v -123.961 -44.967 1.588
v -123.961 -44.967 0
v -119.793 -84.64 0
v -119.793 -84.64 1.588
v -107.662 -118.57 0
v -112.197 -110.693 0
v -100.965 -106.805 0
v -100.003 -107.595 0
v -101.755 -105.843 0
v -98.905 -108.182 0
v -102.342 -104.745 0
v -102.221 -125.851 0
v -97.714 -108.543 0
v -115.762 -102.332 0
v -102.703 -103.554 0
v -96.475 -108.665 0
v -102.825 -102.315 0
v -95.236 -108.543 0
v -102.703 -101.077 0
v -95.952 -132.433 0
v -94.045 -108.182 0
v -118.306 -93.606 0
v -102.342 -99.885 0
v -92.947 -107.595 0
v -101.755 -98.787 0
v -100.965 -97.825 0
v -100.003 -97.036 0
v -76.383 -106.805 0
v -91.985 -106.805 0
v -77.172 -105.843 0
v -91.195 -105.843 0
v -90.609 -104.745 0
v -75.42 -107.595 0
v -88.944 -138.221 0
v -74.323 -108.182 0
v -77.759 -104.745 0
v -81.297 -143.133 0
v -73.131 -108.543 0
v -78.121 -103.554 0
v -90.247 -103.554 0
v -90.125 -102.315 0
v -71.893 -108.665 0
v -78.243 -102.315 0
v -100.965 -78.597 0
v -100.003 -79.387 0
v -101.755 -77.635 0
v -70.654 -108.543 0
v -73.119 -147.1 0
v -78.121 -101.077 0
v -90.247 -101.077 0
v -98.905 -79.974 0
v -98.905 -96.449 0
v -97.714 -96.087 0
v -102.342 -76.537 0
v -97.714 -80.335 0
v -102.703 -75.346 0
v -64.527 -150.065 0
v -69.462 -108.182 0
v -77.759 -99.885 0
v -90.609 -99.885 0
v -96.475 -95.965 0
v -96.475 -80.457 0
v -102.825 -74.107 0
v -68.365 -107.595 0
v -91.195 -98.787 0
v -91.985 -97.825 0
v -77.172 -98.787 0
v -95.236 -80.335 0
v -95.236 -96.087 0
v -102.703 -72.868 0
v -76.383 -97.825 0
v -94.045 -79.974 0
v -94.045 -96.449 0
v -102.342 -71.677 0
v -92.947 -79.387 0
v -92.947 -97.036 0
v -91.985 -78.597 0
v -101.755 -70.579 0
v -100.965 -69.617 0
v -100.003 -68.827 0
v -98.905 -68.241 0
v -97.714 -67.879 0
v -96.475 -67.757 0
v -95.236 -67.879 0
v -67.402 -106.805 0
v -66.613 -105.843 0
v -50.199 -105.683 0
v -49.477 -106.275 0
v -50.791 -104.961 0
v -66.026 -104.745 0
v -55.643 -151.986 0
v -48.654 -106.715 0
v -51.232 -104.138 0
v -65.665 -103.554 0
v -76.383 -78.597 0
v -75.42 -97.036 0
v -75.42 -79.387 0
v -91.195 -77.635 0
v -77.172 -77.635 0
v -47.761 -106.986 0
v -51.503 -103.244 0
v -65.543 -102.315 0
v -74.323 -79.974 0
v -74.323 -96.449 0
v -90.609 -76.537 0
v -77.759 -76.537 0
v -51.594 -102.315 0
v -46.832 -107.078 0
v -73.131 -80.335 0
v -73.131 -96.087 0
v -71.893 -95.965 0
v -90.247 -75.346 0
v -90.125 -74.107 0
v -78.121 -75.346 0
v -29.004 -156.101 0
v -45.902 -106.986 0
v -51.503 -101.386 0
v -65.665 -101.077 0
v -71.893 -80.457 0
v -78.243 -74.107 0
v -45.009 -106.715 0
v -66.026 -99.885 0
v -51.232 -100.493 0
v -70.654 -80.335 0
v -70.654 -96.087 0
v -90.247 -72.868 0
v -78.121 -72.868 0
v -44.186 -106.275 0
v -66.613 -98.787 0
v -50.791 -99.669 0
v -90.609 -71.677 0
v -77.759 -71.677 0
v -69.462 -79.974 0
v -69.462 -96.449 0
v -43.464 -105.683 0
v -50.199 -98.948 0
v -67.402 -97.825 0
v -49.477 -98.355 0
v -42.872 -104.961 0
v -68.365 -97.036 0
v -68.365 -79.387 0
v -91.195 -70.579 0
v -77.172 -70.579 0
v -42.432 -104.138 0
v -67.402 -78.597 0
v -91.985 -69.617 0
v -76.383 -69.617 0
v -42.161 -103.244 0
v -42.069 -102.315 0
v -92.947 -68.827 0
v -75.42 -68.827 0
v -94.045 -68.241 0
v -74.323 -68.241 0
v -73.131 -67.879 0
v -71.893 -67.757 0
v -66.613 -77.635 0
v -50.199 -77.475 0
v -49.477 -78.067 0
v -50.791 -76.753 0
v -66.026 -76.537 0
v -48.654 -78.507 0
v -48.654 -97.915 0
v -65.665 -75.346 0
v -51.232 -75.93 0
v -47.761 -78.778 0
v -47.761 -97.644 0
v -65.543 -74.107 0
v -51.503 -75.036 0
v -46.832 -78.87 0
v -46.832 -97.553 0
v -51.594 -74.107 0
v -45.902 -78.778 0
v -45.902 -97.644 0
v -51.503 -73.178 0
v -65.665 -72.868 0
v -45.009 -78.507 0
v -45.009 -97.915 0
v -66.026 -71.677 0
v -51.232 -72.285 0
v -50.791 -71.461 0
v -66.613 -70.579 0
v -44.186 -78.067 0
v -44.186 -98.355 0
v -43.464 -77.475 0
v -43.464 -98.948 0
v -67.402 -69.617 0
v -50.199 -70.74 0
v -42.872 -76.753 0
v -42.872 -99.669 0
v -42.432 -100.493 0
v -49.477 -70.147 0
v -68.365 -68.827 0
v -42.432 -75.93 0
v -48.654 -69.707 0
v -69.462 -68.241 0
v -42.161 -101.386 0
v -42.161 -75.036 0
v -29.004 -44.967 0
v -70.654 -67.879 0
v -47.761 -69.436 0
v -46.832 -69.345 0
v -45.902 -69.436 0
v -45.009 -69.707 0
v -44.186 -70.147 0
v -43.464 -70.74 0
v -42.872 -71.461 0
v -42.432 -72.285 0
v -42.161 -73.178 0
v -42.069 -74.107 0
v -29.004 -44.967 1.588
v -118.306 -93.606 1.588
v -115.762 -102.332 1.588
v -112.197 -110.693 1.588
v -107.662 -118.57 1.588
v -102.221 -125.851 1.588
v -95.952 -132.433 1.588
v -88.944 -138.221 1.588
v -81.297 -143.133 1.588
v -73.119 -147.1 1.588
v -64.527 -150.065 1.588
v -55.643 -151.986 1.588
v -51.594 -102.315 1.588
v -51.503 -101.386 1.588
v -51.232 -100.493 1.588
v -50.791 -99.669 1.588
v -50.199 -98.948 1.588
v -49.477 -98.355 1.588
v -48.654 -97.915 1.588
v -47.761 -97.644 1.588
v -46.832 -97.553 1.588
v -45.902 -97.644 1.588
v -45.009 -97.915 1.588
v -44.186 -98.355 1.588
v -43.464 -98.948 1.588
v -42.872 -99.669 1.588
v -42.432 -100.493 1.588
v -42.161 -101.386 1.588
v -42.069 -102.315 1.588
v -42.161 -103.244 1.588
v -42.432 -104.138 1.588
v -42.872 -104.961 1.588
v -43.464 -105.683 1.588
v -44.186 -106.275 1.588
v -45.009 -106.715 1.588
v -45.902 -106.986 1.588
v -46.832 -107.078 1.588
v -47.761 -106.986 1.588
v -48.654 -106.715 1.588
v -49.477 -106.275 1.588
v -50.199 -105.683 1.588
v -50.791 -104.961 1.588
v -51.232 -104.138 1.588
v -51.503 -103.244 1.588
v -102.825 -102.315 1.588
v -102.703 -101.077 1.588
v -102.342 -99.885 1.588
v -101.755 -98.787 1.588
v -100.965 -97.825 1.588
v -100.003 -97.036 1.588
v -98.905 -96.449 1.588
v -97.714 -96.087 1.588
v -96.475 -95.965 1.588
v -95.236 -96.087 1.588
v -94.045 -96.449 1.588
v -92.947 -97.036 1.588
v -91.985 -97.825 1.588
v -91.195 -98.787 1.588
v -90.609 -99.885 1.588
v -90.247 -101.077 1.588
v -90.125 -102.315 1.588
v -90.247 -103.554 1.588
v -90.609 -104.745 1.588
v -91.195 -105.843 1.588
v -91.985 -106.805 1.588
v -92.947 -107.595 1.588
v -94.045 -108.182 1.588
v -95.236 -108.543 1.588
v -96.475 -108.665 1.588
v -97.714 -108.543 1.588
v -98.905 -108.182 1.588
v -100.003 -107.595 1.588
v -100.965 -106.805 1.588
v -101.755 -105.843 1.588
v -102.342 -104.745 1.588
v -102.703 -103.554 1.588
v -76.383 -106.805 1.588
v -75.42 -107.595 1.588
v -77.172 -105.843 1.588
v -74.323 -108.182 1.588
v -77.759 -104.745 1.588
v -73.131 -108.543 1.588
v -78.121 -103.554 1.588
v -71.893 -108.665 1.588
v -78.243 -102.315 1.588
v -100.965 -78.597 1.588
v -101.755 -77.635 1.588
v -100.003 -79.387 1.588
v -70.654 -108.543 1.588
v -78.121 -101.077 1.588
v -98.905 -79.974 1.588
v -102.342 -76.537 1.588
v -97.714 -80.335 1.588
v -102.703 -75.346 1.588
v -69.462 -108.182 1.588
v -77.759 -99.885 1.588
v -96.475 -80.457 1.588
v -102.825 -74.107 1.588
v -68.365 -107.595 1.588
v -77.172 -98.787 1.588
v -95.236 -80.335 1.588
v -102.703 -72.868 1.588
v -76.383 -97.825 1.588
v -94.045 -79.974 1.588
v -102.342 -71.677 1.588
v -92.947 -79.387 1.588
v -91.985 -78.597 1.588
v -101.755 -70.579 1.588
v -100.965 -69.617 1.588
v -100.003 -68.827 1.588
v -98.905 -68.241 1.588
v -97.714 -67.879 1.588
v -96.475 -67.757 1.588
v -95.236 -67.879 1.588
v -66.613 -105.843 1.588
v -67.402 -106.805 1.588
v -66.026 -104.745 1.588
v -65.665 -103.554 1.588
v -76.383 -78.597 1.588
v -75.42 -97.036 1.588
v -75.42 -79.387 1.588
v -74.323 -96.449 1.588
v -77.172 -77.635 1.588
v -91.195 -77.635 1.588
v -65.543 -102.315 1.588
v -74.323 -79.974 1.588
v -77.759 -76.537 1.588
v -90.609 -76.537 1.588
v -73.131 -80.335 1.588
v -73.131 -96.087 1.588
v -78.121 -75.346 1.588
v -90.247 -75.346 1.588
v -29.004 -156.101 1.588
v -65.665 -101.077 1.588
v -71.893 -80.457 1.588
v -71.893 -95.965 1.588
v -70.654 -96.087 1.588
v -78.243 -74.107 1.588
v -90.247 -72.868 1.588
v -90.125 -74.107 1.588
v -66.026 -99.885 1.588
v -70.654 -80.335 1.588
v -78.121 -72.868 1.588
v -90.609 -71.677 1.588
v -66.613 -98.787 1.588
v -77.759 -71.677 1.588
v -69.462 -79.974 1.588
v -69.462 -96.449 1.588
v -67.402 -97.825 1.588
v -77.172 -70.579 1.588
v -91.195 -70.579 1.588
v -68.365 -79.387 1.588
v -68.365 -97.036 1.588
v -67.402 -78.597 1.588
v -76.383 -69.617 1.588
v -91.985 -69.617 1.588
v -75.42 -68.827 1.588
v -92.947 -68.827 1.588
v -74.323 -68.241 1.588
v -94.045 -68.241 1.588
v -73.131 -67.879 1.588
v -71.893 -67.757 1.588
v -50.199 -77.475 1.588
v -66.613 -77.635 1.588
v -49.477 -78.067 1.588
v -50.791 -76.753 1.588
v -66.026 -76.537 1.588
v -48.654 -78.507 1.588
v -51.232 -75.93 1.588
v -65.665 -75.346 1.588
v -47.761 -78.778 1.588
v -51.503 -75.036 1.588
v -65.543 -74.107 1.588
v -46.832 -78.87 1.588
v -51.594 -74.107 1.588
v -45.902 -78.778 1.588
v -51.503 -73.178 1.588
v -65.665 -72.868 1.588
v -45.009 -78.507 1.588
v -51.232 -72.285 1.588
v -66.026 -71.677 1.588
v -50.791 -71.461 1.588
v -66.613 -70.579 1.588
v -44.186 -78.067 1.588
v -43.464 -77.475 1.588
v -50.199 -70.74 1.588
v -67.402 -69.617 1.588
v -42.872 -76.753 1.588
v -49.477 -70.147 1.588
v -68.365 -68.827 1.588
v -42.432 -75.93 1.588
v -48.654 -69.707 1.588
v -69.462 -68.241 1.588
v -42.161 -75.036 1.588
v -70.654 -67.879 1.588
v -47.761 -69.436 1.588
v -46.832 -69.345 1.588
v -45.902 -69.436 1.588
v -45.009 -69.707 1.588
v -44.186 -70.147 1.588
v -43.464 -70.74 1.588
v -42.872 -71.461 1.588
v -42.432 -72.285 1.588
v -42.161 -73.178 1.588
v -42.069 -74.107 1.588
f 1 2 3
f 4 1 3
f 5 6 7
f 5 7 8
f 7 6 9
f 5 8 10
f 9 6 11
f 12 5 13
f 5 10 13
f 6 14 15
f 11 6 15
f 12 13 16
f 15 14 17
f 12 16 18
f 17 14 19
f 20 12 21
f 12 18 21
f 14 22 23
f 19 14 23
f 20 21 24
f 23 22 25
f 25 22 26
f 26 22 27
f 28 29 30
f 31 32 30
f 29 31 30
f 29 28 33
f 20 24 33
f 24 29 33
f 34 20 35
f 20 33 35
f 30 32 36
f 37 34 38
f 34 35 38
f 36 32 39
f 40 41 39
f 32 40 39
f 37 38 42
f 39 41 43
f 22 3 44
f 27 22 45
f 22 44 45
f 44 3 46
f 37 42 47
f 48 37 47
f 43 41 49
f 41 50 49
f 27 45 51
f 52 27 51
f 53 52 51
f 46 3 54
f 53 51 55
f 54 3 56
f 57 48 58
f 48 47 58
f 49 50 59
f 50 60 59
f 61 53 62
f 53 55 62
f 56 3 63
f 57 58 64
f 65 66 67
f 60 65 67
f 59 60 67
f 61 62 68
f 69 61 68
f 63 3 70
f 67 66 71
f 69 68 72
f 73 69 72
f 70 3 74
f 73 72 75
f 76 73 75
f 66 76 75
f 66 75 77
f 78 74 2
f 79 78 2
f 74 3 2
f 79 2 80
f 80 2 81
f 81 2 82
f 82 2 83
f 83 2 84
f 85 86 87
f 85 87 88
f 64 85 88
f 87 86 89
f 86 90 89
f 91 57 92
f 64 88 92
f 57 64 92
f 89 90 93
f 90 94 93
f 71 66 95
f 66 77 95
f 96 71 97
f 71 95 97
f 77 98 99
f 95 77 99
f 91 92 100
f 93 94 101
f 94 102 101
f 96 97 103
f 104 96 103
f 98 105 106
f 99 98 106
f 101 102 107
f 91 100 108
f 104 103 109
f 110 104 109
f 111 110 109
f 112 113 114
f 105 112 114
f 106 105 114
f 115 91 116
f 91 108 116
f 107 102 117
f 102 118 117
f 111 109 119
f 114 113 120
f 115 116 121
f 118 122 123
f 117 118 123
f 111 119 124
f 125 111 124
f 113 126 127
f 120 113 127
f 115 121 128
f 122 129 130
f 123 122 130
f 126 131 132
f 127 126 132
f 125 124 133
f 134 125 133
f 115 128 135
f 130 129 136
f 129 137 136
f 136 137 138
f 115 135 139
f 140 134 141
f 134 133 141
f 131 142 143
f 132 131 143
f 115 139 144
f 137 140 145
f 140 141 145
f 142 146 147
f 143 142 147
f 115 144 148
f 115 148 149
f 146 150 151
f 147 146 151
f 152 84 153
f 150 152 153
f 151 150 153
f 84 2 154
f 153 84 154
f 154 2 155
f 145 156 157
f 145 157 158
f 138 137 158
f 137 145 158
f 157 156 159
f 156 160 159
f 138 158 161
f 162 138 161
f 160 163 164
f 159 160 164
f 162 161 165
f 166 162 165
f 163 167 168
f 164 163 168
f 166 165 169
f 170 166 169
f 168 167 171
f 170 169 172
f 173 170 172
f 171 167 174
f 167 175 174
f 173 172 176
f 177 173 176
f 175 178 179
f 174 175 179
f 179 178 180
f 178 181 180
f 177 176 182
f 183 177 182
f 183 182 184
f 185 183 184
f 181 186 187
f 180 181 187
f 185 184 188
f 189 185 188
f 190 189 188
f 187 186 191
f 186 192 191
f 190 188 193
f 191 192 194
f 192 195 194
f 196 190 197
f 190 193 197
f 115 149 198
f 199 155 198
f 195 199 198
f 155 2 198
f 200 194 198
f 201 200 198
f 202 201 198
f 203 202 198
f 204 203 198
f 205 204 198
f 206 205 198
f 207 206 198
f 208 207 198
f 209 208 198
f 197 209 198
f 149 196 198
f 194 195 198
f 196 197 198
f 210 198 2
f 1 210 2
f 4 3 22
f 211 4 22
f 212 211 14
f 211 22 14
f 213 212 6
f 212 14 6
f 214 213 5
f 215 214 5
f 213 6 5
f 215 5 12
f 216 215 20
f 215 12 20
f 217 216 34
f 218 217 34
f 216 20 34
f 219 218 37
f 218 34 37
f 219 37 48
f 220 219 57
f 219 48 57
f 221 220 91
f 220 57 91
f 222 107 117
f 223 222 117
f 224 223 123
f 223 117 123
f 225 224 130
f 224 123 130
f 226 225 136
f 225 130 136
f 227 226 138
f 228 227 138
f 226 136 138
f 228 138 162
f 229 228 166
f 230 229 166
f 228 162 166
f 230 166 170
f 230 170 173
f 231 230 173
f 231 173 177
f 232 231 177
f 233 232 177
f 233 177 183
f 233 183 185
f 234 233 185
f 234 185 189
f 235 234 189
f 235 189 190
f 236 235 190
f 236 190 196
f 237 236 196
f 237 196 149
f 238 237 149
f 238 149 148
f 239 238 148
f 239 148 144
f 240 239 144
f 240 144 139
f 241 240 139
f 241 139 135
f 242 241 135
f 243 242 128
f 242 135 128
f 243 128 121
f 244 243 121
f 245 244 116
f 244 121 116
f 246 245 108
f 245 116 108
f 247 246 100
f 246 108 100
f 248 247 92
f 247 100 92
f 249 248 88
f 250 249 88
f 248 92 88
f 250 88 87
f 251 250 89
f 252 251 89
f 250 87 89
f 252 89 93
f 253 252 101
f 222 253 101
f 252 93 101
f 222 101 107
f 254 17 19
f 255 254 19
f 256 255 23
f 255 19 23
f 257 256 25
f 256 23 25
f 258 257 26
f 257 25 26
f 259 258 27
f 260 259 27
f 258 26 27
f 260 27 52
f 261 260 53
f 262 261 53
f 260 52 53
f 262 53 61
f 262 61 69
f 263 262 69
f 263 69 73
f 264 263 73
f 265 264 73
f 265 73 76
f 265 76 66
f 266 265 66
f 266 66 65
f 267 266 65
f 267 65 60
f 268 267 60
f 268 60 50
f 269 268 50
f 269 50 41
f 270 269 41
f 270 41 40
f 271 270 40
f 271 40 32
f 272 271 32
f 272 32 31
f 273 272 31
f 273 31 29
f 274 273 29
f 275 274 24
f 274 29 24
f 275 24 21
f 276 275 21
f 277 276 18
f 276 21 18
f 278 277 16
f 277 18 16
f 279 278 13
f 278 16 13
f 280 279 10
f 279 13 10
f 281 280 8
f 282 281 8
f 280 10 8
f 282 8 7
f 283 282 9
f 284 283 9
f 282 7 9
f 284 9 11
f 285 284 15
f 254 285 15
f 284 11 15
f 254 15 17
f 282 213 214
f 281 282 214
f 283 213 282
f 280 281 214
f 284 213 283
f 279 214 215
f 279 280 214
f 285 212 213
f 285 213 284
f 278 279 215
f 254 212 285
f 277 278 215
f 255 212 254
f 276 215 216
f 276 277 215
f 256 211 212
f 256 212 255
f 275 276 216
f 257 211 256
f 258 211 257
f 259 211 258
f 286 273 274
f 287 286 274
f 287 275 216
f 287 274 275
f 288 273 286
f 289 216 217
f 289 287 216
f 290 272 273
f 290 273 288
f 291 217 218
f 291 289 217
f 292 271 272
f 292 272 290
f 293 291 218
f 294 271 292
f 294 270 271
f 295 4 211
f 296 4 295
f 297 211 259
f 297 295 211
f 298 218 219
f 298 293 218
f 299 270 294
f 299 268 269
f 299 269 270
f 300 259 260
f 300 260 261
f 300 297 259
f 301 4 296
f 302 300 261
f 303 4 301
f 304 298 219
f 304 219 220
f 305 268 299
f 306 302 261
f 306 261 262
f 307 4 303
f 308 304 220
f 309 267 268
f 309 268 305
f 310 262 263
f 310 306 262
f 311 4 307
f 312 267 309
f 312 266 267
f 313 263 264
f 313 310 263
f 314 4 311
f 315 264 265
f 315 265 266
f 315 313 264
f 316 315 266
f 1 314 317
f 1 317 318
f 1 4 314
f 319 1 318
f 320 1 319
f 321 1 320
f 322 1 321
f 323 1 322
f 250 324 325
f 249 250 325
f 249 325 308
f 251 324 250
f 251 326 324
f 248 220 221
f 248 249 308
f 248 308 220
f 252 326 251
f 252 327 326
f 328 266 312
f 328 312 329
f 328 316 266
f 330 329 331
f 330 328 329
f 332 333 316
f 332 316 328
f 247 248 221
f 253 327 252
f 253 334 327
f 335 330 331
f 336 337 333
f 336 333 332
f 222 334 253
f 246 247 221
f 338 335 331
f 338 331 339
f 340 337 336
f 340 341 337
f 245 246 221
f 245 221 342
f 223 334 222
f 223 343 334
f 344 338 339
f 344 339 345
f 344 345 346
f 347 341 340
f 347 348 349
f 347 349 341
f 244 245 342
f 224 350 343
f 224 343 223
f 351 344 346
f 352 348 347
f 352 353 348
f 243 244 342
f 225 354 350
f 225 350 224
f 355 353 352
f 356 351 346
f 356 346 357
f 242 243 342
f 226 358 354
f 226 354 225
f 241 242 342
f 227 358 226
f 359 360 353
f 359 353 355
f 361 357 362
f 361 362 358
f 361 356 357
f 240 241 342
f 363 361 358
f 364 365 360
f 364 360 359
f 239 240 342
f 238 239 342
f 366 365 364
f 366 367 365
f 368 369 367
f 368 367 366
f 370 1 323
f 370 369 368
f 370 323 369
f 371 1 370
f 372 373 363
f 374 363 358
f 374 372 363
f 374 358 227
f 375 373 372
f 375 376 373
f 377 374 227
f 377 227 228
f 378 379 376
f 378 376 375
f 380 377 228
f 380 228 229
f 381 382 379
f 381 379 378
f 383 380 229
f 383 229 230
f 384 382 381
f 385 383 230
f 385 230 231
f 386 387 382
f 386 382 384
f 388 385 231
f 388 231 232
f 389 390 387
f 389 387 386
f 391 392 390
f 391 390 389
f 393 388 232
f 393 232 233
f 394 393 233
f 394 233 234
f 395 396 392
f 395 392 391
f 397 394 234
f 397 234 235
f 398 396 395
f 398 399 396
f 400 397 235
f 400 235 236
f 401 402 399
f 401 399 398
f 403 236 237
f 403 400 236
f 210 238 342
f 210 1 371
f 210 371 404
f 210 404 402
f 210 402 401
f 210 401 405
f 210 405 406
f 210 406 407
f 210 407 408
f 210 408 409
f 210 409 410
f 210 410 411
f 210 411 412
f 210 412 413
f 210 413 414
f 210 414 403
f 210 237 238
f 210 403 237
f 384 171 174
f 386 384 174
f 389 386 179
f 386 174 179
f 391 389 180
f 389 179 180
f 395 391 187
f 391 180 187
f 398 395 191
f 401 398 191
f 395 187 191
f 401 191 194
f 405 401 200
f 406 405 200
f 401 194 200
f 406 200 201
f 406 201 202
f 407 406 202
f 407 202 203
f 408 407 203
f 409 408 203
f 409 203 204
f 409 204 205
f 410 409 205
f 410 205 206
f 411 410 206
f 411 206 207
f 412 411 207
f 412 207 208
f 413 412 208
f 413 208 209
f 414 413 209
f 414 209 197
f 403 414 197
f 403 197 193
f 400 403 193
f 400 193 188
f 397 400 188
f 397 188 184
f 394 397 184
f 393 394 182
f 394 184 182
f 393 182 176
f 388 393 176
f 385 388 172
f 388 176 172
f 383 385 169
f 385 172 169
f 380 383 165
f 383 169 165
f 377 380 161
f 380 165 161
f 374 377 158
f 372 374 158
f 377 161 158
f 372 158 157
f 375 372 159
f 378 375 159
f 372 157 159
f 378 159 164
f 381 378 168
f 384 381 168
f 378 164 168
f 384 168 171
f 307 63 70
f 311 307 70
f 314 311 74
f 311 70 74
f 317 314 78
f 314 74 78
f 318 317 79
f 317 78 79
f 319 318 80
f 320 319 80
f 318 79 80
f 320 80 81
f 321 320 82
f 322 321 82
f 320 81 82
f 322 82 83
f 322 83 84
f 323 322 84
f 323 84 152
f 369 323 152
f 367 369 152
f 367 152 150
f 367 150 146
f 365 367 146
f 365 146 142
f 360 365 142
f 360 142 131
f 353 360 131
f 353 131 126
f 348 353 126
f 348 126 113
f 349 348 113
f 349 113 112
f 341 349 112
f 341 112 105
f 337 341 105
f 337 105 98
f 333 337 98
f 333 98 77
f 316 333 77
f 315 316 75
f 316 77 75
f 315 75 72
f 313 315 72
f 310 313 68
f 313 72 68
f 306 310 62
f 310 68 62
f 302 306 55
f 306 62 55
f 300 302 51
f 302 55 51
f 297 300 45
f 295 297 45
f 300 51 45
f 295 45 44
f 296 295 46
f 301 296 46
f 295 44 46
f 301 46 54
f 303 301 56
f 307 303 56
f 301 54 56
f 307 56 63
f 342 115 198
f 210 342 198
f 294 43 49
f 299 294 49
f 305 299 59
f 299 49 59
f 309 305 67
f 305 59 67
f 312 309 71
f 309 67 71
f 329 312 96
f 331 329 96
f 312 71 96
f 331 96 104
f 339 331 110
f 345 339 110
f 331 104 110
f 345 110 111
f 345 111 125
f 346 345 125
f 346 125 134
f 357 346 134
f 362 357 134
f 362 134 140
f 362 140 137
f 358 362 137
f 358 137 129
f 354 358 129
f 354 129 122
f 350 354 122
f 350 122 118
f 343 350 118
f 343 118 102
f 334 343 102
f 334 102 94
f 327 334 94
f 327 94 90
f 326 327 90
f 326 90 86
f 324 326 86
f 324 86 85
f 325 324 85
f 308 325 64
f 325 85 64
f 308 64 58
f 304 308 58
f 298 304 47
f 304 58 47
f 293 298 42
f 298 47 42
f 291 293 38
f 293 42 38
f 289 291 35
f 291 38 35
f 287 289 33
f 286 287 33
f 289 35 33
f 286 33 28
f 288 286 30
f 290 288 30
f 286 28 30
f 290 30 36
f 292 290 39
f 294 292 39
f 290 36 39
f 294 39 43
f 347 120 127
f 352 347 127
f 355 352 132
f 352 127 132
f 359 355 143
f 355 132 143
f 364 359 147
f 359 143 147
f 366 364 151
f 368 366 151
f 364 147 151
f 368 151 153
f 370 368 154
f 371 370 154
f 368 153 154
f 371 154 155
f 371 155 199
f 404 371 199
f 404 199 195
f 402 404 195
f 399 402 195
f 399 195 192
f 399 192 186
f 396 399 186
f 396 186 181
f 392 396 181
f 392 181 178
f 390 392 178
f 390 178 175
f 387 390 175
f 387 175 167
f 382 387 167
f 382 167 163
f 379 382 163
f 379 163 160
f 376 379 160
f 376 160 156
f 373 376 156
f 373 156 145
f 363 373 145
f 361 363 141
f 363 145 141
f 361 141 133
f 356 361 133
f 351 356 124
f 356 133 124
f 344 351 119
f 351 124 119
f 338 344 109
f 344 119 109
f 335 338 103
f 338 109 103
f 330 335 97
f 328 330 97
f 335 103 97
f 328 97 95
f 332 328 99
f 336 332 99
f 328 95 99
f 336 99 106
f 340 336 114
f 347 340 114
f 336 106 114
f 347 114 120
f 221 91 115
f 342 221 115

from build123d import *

# Parameters (mm, degrees)
BOSS_EXTRUDE1_DEPTH = 1.5875
SKETCH2_R           = 6.35
SKETCH2_R_2         = 4.7625
CUT_EXTRUDE1_DEPTH  = 200.339494535


with BuildPart() as part:
    # Sketch1 → Boss-Extrude1 (new body)
    with BuildSketch(Plane.XY):
        with BuildLine():
            Line((-29.004064566, -156.10056159), (-29.004064566, -44.966517074))
            Line((-29.004064566, -44.966517074), (-123.96099627, -44.966517074))
            Line((-123.96099627, -44.966517074), (-119.793452617, -84.639660454))
            ThreePointArc((-119.793452617, -84.639660454), (-99.185042421, -129.235543476), (-55.642806391, -151.98577501))
            Line((-55.642806391, -151.98577501), (-29.004064566, -156.10056159))
        make_face()
    extrude(amount=BOSS_EXTRUDE1_DEPTH)

    # Sketch2 → Cut-Extrude1 (cut, through all)
    with BuildSketch(Plane(origin=(0, 0, 0), x_dir=(-1, 0, 0), z_dir=(0, 0, -1))):
        with Locations((71.892516398, -102.315332665)):
            Circle(SKETCH2_R)
        with Locations((96.475228053, -102.315332665)):
            Circle(SKETCH2_R)
        with Locations((96.475228053, -74.107206632)):
            Circle(SKETCH2_R)
        with Locations((71.892516398, -74.107206632)):
            Circle(SKETCH2_R)
        with Locations((46.831572971, -102.315332665)):
            Circle(SKETCH2_R_2)
        with Locations((46.831572971, -74.107206632)):
            Circle(SKETCH2_R_2)
    extrude(amount=-CUT_EXTRUDE1_DEPTH, mode=Mode.SUBTRACT)


solid = part.part
